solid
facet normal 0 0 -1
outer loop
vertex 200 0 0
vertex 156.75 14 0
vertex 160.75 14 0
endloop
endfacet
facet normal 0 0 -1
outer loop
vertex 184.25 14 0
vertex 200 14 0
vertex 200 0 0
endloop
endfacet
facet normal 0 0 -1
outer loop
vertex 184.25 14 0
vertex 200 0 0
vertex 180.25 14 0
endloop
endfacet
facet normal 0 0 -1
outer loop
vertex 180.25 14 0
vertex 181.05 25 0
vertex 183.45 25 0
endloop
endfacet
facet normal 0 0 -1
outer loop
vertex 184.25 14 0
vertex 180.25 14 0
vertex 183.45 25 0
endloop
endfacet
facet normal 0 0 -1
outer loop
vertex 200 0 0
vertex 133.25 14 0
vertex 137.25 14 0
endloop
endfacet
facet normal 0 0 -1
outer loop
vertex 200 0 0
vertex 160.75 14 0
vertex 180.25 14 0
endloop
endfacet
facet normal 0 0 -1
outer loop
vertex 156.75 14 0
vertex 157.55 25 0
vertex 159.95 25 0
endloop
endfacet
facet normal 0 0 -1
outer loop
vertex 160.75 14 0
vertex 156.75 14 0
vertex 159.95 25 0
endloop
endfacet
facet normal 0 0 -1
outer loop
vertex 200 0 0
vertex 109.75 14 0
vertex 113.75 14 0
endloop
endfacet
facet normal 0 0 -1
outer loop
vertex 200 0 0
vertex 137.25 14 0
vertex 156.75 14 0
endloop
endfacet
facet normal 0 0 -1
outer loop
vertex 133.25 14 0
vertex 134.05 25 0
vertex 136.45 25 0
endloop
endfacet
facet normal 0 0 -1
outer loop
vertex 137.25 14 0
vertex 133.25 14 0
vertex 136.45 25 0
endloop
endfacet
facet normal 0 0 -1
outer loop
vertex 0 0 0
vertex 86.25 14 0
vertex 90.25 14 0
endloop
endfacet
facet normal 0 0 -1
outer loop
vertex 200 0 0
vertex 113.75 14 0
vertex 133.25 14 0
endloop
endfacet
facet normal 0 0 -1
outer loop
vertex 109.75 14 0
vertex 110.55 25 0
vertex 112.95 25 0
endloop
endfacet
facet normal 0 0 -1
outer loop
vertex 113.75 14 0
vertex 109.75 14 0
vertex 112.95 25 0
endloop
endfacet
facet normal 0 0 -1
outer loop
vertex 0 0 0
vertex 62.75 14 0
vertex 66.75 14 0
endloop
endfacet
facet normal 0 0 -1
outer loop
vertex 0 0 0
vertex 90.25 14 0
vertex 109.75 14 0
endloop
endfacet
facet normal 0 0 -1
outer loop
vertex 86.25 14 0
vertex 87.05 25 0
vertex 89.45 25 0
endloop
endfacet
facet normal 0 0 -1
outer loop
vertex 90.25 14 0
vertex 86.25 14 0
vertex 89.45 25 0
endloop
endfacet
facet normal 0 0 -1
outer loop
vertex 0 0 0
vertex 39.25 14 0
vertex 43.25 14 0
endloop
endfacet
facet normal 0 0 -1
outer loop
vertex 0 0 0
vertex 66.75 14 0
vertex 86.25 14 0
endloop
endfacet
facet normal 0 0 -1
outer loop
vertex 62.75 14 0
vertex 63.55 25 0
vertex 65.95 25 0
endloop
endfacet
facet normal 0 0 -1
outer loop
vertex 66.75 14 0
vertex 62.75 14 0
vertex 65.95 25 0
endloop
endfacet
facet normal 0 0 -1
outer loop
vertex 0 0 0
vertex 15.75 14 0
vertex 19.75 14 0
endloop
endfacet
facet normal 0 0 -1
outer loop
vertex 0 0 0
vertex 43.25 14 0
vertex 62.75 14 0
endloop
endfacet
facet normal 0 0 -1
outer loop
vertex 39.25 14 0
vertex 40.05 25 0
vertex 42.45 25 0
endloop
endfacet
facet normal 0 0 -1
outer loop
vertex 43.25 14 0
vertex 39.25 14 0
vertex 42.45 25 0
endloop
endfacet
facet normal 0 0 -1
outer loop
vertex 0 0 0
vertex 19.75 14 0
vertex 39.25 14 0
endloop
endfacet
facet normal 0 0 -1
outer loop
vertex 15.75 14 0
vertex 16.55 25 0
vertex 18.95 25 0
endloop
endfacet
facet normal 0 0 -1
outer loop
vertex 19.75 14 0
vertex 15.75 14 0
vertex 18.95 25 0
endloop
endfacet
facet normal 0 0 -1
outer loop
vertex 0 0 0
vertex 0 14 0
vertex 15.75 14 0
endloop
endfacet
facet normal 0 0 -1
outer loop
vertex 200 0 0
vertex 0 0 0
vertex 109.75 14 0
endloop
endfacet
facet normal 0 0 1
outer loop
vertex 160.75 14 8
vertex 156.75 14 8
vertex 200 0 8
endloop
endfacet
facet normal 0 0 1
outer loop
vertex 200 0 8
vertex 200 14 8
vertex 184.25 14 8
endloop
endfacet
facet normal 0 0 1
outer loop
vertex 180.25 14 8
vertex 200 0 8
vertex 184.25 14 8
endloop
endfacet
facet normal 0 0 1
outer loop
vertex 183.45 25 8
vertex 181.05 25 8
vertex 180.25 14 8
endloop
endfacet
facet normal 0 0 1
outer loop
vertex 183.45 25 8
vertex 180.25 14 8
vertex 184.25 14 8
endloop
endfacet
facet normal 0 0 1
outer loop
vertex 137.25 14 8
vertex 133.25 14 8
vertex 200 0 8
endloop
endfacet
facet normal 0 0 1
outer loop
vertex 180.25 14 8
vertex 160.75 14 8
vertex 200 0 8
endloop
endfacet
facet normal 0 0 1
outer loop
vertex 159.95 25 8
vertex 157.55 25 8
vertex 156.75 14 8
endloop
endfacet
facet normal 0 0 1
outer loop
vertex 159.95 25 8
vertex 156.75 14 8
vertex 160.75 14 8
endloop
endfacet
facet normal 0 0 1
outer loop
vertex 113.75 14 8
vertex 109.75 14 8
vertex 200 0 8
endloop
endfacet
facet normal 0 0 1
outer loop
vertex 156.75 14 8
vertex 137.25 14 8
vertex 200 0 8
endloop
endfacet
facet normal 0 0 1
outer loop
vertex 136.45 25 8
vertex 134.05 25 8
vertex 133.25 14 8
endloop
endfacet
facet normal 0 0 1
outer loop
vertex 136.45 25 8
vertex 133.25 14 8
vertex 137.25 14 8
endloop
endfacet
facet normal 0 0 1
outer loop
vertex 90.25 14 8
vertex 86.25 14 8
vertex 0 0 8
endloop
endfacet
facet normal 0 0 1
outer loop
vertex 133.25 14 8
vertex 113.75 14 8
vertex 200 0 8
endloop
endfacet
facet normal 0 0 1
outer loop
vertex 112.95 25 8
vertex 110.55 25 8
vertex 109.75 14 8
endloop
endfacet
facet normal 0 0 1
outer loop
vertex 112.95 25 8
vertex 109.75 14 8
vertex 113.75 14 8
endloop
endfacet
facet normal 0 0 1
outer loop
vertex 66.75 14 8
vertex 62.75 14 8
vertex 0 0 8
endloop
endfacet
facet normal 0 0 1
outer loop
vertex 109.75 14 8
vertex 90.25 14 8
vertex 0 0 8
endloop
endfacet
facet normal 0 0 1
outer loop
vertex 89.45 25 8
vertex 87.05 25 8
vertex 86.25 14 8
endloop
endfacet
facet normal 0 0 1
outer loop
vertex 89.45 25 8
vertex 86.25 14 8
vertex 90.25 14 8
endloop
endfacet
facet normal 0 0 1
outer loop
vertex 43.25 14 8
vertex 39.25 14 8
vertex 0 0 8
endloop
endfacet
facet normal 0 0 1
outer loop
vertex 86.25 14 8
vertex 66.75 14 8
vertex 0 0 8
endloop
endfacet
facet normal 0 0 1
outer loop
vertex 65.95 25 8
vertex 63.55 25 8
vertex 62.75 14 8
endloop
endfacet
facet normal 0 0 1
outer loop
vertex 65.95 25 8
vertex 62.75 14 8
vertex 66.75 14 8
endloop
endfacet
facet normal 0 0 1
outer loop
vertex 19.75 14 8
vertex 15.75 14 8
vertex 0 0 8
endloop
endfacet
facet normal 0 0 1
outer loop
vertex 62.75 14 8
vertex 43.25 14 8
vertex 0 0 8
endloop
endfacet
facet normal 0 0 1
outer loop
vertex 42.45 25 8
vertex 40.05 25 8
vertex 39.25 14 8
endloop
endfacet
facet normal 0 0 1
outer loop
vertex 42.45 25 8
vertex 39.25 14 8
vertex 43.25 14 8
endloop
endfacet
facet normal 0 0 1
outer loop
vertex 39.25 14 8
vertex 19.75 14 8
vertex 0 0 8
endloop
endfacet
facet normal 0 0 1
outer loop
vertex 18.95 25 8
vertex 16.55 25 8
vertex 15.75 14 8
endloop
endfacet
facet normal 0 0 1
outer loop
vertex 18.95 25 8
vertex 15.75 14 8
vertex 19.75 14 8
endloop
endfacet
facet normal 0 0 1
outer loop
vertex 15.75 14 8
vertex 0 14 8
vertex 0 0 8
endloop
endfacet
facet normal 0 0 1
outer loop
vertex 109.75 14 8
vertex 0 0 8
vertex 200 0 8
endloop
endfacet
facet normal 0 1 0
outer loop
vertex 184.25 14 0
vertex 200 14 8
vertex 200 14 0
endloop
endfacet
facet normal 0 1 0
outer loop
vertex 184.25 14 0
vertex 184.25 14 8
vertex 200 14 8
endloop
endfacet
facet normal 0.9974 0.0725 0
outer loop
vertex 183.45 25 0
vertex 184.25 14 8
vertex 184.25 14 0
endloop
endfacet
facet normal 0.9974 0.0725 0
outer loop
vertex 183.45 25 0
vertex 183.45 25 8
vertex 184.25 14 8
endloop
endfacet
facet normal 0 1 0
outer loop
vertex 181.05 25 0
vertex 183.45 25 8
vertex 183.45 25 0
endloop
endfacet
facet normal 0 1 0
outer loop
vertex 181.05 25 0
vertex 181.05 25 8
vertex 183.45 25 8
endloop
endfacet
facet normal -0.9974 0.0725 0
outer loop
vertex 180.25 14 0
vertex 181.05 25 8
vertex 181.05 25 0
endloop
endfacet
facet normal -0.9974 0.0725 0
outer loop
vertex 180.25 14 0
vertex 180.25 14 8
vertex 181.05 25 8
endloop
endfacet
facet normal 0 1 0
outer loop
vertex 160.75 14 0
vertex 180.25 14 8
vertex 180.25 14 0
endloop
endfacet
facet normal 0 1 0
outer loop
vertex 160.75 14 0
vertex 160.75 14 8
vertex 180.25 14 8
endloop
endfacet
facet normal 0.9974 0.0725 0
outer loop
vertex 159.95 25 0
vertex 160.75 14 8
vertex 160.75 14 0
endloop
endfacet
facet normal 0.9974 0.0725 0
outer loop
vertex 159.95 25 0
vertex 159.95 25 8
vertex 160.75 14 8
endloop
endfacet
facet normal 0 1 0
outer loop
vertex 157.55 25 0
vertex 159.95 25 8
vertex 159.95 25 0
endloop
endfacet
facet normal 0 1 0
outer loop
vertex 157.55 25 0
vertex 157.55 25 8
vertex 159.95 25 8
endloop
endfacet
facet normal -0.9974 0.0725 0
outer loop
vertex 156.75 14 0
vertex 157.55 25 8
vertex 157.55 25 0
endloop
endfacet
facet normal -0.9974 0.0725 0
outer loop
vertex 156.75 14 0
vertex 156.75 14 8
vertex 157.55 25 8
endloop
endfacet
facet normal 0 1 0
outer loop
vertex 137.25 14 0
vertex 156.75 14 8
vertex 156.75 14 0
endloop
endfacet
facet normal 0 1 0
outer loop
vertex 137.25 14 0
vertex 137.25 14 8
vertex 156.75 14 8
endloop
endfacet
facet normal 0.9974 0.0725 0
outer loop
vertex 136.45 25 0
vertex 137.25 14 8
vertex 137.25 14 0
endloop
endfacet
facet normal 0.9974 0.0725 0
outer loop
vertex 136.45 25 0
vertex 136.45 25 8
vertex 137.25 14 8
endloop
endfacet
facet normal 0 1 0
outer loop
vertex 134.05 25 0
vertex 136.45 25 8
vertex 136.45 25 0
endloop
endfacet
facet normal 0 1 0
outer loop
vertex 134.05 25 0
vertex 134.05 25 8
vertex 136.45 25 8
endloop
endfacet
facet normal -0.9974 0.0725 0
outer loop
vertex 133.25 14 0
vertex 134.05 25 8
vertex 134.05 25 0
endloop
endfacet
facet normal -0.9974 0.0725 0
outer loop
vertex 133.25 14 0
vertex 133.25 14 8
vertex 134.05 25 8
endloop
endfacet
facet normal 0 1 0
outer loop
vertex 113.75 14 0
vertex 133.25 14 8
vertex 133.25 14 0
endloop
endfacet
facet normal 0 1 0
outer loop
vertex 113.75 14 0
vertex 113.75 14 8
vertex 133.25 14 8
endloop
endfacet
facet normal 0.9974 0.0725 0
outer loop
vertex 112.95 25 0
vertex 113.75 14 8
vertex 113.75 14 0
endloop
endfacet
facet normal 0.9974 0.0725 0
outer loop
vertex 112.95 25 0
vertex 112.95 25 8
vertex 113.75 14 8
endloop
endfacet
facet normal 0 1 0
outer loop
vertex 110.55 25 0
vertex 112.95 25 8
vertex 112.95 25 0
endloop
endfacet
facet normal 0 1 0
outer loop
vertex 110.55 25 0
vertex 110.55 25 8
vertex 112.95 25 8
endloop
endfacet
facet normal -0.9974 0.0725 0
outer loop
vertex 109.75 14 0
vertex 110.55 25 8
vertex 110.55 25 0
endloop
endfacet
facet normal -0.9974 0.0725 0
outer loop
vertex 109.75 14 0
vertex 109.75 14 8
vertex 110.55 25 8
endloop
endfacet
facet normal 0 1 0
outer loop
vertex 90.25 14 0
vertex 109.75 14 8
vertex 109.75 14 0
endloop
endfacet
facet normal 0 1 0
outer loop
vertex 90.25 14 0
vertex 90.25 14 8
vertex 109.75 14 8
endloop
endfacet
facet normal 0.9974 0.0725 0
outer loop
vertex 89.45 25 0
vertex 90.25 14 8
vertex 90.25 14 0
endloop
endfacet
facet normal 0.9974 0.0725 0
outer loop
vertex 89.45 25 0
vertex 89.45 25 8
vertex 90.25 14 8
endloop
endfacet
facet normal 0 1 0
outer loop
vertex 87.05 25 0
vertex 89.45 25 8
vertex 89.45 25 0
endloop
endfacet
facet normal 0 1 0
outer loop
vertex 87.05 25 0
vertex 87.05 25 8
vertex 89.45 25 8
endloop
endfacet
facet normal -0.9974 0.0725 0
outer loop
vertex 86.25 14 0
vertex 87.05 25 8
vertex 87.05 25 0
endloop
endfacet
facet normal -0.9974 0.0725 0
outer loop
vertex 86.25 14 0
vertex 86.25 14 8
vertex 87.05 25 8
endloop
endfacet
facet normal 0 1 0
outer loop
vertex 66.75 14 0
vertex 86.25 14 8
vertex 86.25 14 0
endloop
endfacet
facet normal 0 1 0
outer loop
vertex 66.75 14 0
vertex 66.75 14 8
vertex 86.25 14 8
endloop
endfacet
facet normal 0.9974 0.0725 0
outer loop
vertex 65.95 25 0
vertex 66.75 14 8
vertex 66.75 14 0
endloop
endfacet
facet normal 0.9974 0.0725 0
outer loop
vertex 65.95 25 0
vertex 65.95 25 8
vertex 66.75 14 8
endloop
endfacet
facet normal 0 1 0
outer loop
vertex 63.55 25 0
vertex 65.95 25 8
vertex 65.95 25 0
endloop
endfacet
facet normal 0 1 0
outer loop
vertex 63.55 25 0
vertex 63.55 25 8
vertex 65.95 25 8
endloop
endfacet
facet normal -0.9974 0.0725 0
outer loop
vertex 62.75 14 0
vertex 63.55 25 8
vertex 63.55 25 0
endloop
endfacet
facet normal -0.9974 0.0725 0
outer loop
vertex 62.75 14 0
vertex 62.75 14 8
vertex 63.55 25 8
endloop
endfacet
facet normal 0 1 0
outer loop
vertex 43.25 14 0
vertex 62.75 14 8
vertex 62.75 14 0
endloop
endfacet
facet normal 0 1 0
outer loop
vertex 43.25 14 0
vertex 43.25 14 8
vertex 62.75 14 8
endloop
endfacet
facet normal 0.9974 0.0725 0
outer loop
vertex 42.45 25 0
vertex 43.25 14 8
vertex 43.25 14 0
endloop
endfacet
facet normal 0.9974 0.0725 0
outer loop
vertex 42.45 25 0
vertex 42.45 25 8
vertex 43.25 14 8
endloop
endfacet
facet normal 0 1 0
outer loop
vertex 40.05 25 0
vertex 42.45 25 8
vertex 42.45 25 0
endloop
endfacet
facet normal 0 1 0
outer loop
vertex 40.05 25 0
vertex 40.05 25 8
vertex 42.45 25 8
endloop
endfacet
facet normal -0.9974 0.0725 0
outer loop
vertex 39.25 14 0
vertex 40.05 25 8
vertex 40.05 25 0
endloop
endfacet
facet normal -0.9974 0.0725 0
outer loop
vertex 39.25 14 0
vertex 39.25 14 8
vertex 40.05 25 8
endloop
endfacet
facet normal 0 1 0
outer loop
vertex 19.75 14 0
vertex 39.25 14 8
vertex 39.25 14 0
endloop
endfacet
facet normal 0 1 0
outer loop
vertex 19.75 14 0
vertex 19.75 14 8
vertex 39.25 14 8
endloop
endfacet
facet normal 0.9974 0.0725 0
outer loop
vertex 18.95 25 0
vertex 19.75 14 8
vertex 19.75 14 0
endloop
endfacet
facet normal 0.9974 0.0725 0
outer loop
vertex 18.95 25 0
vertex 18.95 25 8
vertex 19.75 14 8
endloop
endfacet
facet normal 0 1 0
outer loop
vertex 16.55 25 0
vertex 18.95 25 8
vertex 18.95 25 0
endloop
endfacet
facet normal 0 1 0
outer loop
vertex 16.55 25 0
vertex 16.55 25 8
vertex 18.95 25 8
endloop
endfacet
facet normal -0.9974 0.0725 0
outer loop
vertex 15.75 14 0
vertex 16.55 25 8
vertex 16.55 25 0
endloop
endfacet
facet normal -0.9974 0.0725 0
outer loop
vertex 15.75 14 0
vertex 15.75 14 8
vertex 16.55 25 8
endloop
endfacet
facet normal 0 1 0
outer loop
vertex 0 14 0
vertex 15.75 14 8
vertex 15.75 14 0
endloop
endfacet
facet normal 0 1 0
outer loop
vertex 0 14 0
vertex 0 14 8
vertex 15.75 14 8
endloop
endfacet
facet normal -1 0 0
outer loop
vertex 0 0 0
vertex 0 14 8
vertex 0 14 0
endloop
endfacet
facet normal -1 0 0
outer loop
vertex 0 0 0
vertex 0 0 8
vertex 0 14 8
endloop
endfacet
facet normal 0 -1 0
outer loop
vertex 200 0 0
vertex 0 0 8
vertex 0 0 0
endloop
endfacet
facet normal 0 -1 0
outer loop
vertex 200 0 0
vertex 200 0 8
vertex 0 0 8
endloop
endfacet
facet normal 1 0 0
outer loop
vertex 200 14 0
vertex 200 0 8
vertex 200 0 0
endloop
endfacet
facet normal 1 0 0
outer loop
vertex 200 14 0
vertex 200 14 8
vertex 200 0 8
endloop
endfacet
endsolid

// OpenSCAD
$fn = 32;

// ----------------------------------------------------------------------
// Gear rack: 8 teeth on a 200 mm bar, pitch 23.5 mm
// ----------------------------------------------------------------------

// --- parameters (mm) ---
profile_height = 8;       // extrusion height
profile_points = 36;      // points of the closed outline

profile = [[0, 0], [200, 0], [200, 14], [184.25, 14], [183.45, 25], [181.05, 25], [180.25, 14], [160.75, 14], [159.95, 25], [157.55, 25], [156.75, 14], [137.25, 14], [136.45, 25], [134.05, 25], [133.25, 14], [113.75, 14], [112.95, 25], [110.55, 25], [109.75, 14], [90.25, 14], [89.45, 25], [87.05, 25], [86.25, 14], [66.75, 14], [65.95, 25], [63.55, 25], [62.75, 14], [43.25, 14], [42.45, 25], [40.05, 25], [39.25, 14], [19.75, 14], [18.95, 25], [16.55, 25], [15.75, 14], [0, 14]];  // single closed polygon, 36 points, counter clockwise

// --- the one profile operation ---
linear_extrude(height = profile_height) polygon(points = profile);
